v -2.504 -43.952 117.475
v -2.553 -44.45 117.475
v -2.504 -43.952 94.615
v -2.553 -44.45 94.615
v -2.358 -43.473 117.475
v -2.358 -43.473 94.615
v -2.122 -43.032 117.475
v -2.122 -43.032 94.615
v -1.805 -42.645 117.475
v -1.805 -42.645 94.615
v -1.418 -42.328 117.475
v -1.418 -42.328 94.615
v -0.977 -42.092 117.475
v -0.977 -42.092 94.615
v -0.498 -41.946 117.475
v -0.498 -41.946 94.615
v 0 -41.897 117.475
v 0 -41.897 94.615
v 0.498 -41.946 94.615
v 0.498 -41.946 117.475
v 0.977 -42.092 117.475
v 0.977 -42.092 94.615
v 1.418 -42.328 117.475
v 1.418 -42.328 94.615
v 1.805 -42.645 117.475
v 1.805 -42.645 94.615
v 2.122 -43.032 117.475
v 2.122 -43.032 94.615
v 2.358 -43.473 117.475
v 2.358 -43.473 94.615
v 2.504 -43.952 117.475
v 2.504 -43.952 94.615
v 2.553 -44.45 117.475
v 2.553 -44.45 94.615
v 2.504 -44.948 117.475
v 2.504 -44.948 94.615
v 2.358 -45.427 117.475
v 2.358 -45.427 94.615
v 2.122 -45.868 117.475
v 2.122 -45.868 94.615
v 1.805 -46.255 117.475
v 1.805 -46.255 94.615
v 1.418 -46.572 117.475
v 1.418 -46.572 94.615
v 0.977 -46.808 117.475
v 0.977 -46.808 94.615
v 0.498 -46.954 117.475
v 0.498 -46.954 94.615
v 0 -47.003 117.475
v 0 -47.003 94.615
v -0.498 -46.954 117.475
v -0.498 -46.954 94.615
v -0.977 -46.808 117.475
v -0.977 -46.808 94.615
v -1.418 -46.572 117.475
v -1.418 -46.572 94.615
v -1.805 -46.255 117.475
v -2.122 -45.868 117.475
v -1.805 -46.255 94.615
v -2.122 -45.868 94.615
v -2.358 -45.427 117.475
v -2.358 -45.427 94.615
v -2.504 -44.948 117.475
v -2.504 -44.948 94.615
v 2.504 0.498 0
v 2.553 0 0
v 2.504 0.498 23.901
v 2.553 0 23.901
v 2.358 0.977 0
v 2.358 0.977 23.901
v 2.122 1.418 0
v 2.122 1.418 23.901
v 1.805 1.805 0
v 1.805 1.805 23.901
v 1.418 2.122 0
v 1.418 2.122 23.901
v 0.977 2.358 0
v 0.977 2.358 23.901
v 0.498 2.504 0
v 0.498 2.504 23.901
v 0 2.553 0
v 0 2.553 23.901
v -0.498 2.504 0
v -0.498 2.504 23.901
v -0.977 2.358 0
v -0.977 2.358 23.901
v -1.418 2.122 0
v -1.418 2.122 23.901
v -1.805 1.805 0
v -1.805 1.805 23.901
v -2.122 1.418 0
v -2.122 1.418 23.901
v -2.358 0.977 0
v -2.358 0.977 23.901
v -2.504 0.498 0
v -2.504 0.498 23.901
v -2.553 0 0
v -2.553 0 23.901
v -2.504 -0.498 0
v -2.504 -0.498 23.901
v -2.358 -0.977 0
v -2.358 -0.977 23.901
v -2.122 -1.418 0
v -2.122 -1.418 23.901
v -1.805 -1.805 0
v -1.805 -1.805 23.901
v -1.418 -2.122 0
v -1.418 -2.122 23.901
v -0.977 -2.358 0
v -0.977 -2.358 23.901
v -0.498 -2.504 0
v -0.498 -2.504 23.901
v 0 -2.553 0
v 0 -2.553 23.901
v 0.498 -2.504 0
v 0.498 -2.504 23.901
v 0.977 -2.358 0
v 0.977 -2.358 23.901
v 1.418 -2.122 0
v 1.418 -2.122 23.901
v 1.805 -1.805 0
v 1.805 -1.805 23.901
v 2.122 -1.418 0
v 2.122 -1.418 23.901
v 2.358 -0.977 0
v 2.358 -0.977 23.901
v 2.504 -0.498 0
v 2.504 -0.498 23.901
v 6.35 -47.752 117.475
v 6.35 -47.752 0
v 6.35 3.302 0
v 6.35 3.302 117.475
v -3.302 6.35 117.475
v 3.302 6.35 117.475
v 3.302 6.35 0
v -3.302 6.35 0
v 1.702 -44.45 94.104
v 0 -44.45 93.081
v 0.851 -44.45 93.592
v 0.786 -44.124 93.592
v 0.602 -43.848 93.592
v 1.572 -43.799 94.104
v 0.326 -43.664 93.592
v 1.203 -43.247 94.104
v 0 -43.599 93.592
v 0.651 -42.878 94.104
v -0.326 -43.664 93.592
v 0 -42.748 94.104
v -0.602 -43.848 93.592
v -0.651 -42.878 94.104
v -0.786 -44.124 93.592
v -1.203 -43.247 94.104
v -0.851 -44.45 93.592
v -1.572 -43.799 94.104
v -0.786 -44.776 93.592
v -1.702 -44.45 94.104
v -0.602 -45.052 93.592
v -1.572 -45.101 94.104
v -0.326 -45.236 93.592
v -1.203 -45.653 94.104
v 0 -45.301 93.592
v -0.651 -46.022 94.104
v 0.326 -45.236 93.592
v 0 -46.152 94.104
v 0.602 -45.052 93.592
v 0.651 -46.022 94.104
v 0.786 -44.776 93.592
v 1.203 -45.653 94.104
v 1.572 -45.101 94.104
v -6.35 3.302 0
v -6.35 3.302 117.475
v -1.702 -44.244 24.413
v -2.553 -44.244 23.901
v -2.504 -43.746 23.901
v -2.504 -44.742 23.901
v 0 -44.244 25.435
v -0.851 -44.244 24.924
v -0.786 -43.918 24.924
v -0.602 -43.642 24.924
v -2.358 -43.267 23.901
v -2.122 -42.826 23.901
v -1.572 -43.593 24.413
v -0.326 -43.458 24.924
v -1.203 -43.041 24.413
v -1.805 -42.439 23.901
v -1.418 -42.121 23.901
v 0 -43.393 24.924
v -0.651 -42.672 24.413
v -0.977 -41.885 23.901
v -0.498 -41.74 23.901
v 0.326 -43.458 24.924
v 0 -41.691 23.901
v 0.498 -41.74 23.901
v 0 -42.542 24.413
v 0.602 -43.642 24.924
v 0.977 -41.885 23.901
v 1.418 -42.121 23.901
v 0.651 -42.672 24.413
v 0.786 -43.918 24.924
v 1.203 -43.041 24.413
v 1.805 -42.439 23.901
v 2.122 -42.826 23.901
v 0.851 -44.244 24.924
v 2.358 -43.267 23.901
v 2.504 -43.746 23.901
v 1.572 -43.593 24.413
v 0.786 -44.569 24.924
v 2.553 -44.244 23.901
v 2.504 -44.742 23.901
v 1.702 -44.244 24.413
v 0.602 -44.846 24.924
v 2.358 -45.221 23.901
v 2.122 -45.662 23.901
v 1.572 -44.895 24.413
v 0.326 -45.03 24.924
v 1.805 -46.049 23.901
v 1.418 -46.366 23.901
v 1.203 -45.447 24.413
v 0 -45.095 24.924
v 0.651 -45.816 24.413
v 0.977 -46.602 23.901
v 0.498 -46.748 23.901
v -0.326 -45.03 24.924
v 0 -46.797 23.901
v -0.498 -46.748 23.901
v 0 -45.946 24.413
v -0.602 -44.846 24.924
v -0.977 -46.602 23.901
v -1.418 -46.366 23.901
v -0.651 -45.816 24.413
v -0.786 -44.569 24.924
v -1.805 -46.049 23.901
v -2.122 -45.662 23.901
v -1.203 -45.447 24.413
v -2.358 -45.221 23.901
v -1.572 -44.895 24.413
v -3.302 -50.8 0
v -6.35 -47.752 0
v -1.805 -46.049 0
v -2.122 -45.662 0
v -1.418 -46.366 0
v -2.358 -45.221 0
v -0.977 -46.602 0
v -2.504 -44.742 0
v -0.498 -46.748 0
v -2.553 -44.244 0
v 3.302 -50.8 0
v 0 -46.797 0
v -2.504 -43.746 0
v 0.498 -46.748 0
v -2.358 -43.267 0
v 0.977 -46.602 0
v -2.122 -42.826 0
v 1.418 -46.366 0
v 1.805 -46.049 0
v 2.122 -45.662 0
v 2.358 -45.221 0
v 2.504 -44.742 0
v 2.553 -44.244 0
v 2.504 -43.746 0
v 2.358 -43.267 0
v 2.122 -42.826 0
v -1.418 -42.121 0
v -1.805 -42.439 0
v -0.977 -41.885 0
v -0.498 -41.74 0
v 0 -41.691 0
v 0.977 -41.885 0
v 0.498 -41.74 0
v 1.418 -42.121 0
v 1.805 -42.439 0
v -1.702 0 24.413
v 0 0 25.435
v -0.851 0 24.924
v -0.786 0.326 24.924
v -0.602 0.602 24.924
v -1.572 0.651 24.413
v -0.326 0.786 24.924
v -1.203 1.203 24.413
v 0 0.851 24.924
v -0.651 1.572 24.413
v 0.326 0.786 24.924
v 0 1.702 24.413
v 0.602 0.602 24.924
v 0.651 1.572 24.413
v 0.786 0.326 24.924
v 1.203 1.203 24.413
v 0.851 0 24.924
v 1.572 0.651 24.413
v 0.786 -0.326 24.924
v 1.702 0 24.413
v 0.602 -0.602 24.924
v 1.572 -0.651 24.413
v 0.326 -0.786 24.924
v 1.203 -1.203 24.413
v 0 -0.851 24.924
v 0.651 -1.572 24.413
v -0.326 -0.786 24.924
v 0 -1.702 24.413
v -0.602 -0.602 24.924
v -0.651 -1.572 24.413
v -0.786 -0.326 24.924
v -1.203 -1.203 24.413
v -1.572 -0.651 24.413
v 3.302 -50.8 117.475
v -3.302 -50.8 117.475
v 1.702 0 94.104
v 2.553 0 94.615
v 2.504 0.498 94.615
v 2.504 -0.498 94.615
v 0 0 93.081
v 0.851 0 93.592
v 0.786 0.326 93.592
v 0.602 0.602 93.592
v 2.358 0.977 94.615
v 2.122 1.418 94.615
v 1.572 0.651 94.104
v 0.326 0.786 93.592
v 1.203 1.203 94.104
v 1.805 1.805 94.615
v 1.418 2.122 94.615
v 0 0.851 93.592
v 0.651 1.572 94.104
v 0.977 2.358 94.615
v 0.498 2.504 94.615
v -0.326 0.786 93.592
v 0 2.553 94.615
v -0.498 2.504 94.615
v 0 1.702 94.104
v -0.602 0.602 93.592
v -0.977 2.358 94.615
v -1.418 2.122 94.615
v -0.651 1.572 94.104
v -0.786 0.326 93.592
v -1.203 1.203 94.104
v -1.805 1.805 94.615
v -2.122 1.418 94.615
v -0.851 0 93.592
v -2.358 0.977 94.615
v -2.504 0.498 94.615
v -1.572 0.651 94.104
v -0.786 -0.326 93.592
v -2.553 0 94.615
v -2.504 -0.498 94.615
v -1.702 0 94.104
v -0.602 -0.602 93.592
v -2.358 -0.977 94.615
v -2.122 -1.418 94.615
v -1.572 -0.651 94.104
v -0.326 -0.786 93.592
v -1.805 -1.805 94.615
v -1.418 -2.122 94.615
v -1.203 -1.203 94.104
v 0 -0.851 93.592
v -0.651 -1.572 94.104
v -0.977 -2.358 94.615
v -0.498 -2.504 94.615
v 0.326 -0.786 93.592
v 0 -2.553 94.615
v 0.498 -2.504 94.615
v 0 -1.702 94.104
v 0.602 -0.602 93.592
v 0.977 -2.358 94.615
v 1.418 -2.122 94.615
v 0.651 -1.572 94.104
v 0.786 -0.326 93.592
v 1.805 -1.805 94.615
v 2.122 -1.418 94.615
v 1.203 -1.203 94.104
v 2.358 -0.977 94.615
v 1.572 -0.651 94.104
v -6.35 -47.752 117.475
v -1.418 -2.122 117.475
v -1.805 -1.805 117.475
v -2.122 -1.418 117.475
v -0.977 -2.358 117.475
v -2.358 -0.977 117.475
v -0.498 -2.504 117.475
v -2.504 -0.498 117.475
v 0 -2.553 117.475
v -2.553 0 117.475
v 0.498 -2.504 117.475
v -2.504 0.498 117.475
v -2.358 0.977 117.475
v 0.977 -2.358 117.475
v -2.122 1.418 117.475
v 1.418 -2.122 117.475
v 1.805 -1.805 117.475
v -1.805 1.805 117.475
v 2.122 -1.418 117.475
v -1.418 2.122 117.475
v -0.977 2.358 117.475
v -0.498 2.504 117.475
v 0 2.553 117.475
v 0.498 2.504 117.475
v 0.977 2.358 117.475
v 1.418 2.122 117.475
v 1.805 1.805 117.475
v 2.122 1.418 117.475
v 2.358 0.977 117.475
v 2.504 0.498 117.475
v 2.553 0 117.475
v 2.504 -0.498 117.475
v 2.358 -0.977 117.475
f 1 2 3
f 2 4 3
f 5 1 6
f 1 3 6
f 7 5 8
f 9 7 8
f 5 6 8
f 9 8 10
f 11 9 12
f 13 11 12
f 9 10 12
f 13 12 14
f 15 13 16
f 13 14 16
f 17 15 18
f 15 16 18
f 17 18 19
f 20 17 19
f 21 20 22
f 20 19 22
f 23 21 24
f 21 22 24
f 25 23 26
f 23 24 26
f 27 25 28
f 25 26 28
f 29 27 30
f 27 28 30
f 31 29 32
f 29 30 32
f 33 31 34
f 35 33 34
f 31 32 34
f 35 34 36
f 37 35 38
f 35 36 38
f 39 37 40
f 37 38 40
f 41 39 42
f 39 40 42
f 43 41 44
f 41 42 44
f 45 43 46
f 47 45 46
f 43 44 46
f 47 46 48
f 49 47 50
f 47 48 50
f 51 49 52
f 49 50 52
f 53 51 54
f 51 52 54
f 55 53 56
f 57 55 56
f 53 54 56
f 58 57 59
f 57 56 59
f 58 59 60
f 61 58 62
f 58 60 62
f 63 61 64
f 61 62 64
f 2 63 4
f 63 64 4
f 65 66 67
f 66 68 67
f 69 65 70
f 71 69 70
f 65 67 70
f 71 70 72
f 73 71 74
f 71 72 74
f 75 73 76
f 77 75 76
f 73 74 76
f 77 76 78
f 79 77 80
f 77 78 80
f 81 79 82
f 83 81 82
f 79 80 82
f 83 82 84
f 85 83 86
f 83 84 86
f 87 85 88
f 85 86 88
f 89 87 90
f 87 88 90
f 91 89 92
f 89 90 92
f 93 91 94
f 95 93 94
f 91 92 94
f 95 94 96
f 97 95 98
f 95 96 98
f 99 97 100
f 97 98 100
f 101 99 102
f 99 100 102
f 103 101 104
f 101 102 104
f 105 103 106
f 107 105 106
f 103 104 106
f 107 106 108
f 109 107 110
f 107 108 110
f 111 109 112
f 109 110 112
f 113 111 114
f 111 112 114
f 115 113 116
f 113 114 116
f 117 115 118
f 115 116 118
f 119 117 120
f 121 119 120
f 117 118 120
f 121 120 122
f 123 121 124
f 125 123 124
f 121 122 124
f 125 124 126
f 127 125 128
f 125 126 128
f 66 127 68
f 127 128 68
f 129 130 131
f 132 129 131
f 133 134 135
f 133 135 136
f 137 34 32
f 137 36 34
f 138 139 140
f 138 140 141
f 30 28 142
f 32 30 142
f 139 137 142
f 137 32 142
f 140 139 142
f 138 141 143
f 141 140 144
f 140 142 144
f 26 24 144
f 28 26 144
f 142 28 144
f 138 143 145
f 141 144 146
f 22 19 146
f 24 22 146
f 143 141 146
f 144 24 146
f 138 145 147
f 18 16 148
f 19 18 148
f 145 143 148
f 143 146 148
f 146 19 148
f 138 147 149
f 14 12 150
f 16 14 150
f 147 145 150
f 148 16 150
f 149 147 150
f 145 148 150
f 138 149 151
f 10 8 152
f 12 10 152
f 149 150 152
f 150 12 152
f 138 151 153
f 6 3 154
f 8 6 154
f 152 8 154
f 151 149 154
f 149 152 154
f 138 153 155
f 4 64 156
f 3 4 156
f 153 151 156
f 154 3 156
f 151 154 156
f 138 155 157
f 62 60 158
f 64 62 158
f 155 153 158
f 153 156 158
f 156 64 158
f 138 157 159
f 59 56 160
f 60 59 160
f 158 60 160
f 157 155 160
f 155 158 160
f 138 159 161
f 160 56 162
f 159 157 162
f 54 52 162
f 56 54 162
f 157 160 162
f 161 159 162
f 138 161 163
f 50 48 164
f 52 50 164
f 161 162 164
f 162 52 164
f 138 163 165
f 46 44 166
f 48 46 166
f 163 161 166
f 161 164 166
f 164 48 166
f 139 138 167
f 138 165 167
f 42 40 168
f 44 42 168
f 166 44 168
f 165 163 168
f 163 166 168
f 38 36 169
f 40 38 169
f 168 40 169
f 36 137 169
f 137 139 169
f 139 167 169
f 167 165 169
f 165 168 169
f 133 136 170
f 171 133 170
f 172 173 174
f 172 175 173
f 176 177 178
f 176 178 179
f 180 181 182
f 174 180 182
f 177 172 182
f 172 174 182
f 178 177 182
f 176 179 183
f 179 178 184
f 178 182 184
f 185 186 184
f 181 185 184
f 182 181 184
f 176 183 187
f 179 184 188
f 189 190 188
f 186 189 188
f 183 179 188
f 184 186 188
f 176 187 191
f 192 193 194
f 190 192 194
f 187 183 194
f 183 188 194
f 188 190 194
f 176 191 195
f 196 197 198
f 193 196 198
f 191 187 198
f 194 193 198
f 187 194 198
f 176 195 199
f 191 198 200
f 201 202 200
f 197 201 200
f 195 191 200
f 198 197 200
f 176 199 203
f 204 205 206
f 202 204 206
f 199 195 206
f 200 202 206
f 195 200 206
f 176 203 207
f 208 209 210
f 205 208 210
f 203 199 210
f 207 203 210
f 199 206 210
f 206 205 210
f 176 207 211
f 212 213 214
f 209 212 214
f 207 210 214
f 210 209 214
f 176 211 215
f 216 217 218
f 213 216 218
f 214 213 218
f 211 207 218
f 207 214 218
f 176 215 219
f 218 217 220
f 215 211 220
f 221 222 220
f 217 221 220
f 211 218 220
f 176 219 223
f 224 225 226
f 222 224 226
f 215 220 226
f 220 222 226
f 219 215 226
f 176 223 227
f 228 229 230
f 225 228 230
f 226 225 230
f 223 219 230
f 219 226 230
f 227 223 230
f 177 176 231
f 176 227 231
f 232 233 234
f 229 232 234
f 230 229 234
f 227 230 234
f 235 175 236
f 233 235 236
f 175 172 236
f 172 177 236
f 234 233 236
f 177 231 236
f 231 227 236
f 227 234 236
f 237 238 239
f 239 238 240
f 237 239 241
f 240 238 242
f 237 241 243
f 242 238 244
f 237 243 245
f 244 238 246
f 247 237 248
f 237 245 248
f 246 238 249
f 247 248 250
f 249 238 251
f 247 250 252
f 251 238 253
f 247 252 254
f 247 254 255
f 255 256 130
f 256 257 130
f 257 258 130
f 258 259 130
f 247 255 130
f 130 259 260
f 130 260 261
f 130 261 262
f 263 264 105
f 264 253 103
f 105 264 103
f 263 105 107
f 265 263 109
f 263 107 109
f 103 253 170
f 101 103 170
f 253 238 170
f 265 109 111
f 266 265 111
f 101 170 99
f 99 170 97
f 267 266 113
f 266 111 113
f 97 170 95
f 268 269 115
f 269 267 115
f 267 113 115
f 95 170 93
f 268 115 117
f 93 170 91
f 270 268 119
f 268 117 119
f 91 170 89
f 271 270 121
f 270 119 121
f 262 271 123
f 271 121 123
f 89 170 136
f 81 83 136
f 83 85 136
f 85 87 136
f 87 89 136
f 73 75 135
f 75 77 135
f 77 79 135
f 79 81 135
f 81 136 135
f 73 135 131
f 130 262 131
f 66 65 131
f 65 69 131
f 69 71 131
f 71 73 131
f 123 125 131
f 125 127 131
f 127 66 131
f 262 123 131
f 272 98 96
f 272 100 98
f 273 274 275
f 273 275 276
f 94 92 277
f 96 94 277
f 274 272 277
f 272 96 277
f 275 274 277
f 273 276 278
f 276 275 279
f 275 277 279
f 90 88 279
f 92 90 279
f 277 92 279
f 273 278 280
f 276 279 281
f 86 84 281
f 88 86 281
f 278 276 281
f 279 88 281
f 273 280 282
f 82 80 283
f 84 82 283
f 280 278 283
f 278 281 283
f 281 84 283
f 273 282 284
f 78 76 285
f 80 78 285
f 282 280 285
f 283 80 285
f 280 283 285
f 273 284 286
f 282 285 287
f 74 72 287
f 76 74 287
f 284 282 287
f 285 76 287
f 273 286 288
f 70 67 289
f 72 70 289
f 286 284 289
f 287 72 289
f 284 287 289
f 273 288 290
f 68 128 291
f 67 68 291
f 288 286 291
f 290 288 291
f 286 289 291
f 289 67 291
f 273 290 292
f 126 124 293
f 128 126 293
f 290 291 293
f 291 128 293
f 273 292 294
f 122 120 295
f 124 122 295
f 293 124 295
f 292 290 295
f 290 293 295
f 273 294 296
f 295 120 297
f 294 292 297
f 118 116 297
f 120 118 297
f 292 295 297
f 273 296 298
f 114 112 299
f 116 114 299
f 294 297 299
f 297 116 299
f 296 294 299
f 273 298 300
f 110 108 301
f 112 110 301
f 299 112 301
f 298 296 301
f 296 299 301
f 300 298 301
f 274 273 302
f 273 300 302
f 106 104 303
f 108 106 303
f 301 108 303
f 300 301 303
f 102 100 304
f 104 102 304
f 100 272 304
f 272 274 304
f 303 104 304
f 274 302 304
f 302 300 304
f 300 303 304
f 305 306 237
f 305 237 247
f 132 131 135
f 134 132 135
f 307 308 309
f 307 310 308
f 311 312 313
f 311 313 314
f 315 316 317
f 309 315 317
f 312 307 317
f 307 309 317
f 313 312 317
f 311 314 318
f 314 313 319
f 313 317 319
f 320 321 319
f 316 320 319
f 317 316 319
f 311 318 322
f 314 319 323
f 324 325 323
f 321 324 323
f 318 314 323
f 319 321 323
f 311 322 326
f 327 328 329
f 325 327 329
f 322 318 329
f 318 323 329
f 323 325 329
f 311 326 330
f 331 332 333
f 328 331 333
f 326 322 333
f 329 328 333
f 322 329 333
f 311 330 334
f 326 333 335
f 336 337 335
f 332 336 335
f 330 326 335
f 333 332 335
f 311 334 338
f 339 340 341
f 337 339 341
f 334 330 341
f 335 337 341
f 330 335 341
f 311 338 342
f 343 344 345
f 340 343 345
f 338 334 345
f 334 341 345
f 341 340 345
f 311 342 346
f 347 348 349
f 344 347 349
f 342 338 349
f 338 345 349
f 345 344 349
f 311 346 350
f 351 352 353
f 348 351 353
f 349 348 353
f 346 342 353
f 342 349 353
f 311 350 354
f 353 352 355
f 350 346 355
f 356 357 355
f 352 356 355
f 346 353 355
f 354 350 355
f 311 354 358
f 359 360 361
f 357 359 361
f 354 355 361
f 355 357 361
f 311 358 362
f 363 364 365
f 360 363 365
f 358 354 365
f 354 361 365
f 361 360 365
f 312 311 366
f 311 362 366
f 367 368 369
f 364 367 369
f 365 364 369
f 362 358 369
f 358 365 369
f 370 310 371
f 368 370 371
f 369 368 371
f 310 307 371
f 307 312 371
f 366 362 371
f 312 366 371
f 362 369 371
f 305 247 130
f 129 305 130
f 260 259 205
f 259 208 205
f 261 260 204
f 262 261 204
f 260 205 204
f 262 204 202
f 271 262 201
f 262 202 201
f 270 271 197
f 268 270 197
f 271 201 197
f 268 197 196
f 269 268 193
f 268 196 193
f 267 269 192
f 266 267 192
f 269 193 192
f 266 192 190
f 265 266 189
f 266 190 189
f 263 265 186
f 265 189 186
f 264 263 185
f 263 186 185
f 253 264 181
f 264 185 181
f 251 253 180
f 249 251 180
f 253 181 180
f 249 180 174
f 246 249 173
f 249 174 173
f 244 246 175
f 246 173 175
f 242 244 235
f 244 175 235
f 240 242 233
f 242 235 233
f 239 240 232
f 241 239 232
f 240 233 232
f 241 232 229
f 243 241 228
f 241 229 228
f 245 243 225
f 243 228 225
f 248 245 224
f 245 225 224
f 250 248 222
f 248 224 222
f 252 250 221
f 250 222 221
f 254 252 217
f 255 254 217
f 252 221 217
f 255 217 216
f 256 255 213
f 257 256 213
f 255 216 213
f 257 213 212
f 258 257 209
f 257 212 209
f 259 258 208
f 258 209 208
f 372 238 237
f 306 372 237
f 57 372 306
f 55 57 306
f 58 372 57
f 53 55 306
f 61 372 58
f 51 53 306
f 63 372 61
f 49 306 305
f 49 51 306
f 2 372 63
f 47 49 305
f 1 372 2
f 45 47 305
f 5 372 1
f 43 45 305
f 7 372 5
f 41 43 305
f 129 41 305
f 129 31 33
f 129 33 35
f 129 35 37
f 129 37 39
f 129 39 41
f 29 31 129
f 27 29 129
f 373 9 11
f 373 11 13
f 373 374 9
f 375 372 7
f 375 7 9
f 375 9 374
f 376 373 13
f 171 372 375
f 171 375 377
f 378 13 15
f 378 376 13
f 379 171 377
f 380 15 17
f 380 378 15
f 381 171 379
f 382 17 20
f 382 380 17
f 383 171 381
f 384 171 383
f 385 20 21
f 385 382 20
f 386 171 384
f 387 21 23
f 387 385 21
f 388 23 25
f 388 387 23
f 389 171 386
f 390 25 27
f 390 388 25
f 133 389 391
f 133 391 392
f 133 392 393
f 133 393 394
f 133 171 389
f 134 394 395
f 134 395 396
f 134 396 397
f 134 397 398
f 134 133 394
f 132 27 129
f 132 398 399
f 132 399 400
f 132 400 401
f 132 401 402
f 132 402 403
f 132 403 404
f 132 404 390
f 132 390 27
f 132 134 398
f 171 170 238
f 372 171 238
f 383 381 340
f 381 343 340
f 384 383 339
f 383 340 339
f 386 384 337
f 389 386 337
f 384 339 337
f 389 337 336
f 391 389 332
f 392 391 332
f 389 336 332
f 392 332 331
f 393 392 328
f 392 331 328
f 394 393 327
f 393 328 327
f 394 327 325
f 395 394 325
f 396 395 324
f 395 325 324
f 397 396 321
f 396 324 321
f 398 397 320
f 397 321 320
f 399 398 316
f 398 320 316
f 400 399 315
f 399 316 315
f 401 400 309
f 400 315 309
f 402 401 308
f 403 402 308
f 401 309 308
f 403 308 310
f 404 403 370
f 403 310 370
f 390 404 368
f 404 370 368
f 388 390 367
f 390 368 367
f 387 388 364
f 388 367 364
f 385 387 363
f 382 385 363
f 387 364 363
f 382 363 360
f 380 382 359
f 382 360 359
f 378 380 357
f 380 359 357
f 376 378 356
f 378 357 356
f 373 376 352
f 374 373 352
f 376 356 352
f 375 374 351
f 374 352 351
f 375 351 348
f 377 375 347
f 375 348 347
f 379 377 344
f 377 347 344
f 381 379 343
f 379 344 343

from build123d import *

# Parameters (mm, degrees)
BOSS_EXTRUDE1_DEPTH         = 117.475
F_1_4_20_TAPPED_HOLE1_D     = 5.1054
F_1_4_20_TAPPED_HOLE1_DEPTH = 22.86
F_1_4_20_TAPPED_HOLE1_TIP   = 1.533816902
F_1_4_20_TAPPED_HOLE2_D     = 5.1054
F_1_4_20_TAPPED_HOLE2_DEPTH = 23.9014
F_1_4_20_TAPPED_HOLE2_TIP   = 1.533816902


with BuildPart() as part:
    # Sketch1 → Boss-Extrude1 (new body)
    with BuildSketch(Plane.XY):
        Polygon((-3.302, 6.35), (-6.35, 3.302), (-6.35, -47.752), (-3.302, -50.8), (3.302, -50.8), (6.35, -47.752), (6.35, 3.302), (3.302, 6.35), align=None)
    extrude(amount=BOSS_EXTRUDE1_DEPTH)

    # 1/4-20 Tapped Hole1
    with Locations(Plane.XY.offset(117.475)):
        with Locations((0, 0), (0, -44.45)):
            Hole(F_1_4_20_TAPPED_HOLE1_D / 2, depth=F_1_4_20_TAPPED_HOLE1_DEPTH)
            with Locations((0, 0, -(F_1_4_20_TAPPED_HOLE1_DEPTH + F_1_4_20_TAPPED_HOLE1_TIP / 2))):  # 118° drill point
                Cone(0, F_1_4_20_TAPPED_HOLE1_D / 2, F_1_4_20_TAPPED_HOLE1_TIP, mode=Mode.SUBTRACT)

    # 1/4-20 Tapped Hole2
    with Locations(Plane(origin=(0, 0, 0), x_dir=(-1, 0, 0), z_dir=(0, 0, -1))):
        with Locations((0, 0), (0, -44.243867412)):
            Hole(F_1_4_20_TAPPED_HOLE2_D / 2, depth=F_1_4_20_TAPPED_HOLE2_DEPTH)
            with Locations((0, 0, -(F_1_4_20_TAPPED_HOLE2_DEPTH + F_1_4_20_TAPPED_HOLE2_TIP / 2))):  # 118° drill point
                Cone(0, F_1_4_20_TAPPED_HOLE2_D / 2, F_1_4_20_TAPPED_HOLE2_TIP, mode=Mode.SUBTRACT)


solid = part.part
